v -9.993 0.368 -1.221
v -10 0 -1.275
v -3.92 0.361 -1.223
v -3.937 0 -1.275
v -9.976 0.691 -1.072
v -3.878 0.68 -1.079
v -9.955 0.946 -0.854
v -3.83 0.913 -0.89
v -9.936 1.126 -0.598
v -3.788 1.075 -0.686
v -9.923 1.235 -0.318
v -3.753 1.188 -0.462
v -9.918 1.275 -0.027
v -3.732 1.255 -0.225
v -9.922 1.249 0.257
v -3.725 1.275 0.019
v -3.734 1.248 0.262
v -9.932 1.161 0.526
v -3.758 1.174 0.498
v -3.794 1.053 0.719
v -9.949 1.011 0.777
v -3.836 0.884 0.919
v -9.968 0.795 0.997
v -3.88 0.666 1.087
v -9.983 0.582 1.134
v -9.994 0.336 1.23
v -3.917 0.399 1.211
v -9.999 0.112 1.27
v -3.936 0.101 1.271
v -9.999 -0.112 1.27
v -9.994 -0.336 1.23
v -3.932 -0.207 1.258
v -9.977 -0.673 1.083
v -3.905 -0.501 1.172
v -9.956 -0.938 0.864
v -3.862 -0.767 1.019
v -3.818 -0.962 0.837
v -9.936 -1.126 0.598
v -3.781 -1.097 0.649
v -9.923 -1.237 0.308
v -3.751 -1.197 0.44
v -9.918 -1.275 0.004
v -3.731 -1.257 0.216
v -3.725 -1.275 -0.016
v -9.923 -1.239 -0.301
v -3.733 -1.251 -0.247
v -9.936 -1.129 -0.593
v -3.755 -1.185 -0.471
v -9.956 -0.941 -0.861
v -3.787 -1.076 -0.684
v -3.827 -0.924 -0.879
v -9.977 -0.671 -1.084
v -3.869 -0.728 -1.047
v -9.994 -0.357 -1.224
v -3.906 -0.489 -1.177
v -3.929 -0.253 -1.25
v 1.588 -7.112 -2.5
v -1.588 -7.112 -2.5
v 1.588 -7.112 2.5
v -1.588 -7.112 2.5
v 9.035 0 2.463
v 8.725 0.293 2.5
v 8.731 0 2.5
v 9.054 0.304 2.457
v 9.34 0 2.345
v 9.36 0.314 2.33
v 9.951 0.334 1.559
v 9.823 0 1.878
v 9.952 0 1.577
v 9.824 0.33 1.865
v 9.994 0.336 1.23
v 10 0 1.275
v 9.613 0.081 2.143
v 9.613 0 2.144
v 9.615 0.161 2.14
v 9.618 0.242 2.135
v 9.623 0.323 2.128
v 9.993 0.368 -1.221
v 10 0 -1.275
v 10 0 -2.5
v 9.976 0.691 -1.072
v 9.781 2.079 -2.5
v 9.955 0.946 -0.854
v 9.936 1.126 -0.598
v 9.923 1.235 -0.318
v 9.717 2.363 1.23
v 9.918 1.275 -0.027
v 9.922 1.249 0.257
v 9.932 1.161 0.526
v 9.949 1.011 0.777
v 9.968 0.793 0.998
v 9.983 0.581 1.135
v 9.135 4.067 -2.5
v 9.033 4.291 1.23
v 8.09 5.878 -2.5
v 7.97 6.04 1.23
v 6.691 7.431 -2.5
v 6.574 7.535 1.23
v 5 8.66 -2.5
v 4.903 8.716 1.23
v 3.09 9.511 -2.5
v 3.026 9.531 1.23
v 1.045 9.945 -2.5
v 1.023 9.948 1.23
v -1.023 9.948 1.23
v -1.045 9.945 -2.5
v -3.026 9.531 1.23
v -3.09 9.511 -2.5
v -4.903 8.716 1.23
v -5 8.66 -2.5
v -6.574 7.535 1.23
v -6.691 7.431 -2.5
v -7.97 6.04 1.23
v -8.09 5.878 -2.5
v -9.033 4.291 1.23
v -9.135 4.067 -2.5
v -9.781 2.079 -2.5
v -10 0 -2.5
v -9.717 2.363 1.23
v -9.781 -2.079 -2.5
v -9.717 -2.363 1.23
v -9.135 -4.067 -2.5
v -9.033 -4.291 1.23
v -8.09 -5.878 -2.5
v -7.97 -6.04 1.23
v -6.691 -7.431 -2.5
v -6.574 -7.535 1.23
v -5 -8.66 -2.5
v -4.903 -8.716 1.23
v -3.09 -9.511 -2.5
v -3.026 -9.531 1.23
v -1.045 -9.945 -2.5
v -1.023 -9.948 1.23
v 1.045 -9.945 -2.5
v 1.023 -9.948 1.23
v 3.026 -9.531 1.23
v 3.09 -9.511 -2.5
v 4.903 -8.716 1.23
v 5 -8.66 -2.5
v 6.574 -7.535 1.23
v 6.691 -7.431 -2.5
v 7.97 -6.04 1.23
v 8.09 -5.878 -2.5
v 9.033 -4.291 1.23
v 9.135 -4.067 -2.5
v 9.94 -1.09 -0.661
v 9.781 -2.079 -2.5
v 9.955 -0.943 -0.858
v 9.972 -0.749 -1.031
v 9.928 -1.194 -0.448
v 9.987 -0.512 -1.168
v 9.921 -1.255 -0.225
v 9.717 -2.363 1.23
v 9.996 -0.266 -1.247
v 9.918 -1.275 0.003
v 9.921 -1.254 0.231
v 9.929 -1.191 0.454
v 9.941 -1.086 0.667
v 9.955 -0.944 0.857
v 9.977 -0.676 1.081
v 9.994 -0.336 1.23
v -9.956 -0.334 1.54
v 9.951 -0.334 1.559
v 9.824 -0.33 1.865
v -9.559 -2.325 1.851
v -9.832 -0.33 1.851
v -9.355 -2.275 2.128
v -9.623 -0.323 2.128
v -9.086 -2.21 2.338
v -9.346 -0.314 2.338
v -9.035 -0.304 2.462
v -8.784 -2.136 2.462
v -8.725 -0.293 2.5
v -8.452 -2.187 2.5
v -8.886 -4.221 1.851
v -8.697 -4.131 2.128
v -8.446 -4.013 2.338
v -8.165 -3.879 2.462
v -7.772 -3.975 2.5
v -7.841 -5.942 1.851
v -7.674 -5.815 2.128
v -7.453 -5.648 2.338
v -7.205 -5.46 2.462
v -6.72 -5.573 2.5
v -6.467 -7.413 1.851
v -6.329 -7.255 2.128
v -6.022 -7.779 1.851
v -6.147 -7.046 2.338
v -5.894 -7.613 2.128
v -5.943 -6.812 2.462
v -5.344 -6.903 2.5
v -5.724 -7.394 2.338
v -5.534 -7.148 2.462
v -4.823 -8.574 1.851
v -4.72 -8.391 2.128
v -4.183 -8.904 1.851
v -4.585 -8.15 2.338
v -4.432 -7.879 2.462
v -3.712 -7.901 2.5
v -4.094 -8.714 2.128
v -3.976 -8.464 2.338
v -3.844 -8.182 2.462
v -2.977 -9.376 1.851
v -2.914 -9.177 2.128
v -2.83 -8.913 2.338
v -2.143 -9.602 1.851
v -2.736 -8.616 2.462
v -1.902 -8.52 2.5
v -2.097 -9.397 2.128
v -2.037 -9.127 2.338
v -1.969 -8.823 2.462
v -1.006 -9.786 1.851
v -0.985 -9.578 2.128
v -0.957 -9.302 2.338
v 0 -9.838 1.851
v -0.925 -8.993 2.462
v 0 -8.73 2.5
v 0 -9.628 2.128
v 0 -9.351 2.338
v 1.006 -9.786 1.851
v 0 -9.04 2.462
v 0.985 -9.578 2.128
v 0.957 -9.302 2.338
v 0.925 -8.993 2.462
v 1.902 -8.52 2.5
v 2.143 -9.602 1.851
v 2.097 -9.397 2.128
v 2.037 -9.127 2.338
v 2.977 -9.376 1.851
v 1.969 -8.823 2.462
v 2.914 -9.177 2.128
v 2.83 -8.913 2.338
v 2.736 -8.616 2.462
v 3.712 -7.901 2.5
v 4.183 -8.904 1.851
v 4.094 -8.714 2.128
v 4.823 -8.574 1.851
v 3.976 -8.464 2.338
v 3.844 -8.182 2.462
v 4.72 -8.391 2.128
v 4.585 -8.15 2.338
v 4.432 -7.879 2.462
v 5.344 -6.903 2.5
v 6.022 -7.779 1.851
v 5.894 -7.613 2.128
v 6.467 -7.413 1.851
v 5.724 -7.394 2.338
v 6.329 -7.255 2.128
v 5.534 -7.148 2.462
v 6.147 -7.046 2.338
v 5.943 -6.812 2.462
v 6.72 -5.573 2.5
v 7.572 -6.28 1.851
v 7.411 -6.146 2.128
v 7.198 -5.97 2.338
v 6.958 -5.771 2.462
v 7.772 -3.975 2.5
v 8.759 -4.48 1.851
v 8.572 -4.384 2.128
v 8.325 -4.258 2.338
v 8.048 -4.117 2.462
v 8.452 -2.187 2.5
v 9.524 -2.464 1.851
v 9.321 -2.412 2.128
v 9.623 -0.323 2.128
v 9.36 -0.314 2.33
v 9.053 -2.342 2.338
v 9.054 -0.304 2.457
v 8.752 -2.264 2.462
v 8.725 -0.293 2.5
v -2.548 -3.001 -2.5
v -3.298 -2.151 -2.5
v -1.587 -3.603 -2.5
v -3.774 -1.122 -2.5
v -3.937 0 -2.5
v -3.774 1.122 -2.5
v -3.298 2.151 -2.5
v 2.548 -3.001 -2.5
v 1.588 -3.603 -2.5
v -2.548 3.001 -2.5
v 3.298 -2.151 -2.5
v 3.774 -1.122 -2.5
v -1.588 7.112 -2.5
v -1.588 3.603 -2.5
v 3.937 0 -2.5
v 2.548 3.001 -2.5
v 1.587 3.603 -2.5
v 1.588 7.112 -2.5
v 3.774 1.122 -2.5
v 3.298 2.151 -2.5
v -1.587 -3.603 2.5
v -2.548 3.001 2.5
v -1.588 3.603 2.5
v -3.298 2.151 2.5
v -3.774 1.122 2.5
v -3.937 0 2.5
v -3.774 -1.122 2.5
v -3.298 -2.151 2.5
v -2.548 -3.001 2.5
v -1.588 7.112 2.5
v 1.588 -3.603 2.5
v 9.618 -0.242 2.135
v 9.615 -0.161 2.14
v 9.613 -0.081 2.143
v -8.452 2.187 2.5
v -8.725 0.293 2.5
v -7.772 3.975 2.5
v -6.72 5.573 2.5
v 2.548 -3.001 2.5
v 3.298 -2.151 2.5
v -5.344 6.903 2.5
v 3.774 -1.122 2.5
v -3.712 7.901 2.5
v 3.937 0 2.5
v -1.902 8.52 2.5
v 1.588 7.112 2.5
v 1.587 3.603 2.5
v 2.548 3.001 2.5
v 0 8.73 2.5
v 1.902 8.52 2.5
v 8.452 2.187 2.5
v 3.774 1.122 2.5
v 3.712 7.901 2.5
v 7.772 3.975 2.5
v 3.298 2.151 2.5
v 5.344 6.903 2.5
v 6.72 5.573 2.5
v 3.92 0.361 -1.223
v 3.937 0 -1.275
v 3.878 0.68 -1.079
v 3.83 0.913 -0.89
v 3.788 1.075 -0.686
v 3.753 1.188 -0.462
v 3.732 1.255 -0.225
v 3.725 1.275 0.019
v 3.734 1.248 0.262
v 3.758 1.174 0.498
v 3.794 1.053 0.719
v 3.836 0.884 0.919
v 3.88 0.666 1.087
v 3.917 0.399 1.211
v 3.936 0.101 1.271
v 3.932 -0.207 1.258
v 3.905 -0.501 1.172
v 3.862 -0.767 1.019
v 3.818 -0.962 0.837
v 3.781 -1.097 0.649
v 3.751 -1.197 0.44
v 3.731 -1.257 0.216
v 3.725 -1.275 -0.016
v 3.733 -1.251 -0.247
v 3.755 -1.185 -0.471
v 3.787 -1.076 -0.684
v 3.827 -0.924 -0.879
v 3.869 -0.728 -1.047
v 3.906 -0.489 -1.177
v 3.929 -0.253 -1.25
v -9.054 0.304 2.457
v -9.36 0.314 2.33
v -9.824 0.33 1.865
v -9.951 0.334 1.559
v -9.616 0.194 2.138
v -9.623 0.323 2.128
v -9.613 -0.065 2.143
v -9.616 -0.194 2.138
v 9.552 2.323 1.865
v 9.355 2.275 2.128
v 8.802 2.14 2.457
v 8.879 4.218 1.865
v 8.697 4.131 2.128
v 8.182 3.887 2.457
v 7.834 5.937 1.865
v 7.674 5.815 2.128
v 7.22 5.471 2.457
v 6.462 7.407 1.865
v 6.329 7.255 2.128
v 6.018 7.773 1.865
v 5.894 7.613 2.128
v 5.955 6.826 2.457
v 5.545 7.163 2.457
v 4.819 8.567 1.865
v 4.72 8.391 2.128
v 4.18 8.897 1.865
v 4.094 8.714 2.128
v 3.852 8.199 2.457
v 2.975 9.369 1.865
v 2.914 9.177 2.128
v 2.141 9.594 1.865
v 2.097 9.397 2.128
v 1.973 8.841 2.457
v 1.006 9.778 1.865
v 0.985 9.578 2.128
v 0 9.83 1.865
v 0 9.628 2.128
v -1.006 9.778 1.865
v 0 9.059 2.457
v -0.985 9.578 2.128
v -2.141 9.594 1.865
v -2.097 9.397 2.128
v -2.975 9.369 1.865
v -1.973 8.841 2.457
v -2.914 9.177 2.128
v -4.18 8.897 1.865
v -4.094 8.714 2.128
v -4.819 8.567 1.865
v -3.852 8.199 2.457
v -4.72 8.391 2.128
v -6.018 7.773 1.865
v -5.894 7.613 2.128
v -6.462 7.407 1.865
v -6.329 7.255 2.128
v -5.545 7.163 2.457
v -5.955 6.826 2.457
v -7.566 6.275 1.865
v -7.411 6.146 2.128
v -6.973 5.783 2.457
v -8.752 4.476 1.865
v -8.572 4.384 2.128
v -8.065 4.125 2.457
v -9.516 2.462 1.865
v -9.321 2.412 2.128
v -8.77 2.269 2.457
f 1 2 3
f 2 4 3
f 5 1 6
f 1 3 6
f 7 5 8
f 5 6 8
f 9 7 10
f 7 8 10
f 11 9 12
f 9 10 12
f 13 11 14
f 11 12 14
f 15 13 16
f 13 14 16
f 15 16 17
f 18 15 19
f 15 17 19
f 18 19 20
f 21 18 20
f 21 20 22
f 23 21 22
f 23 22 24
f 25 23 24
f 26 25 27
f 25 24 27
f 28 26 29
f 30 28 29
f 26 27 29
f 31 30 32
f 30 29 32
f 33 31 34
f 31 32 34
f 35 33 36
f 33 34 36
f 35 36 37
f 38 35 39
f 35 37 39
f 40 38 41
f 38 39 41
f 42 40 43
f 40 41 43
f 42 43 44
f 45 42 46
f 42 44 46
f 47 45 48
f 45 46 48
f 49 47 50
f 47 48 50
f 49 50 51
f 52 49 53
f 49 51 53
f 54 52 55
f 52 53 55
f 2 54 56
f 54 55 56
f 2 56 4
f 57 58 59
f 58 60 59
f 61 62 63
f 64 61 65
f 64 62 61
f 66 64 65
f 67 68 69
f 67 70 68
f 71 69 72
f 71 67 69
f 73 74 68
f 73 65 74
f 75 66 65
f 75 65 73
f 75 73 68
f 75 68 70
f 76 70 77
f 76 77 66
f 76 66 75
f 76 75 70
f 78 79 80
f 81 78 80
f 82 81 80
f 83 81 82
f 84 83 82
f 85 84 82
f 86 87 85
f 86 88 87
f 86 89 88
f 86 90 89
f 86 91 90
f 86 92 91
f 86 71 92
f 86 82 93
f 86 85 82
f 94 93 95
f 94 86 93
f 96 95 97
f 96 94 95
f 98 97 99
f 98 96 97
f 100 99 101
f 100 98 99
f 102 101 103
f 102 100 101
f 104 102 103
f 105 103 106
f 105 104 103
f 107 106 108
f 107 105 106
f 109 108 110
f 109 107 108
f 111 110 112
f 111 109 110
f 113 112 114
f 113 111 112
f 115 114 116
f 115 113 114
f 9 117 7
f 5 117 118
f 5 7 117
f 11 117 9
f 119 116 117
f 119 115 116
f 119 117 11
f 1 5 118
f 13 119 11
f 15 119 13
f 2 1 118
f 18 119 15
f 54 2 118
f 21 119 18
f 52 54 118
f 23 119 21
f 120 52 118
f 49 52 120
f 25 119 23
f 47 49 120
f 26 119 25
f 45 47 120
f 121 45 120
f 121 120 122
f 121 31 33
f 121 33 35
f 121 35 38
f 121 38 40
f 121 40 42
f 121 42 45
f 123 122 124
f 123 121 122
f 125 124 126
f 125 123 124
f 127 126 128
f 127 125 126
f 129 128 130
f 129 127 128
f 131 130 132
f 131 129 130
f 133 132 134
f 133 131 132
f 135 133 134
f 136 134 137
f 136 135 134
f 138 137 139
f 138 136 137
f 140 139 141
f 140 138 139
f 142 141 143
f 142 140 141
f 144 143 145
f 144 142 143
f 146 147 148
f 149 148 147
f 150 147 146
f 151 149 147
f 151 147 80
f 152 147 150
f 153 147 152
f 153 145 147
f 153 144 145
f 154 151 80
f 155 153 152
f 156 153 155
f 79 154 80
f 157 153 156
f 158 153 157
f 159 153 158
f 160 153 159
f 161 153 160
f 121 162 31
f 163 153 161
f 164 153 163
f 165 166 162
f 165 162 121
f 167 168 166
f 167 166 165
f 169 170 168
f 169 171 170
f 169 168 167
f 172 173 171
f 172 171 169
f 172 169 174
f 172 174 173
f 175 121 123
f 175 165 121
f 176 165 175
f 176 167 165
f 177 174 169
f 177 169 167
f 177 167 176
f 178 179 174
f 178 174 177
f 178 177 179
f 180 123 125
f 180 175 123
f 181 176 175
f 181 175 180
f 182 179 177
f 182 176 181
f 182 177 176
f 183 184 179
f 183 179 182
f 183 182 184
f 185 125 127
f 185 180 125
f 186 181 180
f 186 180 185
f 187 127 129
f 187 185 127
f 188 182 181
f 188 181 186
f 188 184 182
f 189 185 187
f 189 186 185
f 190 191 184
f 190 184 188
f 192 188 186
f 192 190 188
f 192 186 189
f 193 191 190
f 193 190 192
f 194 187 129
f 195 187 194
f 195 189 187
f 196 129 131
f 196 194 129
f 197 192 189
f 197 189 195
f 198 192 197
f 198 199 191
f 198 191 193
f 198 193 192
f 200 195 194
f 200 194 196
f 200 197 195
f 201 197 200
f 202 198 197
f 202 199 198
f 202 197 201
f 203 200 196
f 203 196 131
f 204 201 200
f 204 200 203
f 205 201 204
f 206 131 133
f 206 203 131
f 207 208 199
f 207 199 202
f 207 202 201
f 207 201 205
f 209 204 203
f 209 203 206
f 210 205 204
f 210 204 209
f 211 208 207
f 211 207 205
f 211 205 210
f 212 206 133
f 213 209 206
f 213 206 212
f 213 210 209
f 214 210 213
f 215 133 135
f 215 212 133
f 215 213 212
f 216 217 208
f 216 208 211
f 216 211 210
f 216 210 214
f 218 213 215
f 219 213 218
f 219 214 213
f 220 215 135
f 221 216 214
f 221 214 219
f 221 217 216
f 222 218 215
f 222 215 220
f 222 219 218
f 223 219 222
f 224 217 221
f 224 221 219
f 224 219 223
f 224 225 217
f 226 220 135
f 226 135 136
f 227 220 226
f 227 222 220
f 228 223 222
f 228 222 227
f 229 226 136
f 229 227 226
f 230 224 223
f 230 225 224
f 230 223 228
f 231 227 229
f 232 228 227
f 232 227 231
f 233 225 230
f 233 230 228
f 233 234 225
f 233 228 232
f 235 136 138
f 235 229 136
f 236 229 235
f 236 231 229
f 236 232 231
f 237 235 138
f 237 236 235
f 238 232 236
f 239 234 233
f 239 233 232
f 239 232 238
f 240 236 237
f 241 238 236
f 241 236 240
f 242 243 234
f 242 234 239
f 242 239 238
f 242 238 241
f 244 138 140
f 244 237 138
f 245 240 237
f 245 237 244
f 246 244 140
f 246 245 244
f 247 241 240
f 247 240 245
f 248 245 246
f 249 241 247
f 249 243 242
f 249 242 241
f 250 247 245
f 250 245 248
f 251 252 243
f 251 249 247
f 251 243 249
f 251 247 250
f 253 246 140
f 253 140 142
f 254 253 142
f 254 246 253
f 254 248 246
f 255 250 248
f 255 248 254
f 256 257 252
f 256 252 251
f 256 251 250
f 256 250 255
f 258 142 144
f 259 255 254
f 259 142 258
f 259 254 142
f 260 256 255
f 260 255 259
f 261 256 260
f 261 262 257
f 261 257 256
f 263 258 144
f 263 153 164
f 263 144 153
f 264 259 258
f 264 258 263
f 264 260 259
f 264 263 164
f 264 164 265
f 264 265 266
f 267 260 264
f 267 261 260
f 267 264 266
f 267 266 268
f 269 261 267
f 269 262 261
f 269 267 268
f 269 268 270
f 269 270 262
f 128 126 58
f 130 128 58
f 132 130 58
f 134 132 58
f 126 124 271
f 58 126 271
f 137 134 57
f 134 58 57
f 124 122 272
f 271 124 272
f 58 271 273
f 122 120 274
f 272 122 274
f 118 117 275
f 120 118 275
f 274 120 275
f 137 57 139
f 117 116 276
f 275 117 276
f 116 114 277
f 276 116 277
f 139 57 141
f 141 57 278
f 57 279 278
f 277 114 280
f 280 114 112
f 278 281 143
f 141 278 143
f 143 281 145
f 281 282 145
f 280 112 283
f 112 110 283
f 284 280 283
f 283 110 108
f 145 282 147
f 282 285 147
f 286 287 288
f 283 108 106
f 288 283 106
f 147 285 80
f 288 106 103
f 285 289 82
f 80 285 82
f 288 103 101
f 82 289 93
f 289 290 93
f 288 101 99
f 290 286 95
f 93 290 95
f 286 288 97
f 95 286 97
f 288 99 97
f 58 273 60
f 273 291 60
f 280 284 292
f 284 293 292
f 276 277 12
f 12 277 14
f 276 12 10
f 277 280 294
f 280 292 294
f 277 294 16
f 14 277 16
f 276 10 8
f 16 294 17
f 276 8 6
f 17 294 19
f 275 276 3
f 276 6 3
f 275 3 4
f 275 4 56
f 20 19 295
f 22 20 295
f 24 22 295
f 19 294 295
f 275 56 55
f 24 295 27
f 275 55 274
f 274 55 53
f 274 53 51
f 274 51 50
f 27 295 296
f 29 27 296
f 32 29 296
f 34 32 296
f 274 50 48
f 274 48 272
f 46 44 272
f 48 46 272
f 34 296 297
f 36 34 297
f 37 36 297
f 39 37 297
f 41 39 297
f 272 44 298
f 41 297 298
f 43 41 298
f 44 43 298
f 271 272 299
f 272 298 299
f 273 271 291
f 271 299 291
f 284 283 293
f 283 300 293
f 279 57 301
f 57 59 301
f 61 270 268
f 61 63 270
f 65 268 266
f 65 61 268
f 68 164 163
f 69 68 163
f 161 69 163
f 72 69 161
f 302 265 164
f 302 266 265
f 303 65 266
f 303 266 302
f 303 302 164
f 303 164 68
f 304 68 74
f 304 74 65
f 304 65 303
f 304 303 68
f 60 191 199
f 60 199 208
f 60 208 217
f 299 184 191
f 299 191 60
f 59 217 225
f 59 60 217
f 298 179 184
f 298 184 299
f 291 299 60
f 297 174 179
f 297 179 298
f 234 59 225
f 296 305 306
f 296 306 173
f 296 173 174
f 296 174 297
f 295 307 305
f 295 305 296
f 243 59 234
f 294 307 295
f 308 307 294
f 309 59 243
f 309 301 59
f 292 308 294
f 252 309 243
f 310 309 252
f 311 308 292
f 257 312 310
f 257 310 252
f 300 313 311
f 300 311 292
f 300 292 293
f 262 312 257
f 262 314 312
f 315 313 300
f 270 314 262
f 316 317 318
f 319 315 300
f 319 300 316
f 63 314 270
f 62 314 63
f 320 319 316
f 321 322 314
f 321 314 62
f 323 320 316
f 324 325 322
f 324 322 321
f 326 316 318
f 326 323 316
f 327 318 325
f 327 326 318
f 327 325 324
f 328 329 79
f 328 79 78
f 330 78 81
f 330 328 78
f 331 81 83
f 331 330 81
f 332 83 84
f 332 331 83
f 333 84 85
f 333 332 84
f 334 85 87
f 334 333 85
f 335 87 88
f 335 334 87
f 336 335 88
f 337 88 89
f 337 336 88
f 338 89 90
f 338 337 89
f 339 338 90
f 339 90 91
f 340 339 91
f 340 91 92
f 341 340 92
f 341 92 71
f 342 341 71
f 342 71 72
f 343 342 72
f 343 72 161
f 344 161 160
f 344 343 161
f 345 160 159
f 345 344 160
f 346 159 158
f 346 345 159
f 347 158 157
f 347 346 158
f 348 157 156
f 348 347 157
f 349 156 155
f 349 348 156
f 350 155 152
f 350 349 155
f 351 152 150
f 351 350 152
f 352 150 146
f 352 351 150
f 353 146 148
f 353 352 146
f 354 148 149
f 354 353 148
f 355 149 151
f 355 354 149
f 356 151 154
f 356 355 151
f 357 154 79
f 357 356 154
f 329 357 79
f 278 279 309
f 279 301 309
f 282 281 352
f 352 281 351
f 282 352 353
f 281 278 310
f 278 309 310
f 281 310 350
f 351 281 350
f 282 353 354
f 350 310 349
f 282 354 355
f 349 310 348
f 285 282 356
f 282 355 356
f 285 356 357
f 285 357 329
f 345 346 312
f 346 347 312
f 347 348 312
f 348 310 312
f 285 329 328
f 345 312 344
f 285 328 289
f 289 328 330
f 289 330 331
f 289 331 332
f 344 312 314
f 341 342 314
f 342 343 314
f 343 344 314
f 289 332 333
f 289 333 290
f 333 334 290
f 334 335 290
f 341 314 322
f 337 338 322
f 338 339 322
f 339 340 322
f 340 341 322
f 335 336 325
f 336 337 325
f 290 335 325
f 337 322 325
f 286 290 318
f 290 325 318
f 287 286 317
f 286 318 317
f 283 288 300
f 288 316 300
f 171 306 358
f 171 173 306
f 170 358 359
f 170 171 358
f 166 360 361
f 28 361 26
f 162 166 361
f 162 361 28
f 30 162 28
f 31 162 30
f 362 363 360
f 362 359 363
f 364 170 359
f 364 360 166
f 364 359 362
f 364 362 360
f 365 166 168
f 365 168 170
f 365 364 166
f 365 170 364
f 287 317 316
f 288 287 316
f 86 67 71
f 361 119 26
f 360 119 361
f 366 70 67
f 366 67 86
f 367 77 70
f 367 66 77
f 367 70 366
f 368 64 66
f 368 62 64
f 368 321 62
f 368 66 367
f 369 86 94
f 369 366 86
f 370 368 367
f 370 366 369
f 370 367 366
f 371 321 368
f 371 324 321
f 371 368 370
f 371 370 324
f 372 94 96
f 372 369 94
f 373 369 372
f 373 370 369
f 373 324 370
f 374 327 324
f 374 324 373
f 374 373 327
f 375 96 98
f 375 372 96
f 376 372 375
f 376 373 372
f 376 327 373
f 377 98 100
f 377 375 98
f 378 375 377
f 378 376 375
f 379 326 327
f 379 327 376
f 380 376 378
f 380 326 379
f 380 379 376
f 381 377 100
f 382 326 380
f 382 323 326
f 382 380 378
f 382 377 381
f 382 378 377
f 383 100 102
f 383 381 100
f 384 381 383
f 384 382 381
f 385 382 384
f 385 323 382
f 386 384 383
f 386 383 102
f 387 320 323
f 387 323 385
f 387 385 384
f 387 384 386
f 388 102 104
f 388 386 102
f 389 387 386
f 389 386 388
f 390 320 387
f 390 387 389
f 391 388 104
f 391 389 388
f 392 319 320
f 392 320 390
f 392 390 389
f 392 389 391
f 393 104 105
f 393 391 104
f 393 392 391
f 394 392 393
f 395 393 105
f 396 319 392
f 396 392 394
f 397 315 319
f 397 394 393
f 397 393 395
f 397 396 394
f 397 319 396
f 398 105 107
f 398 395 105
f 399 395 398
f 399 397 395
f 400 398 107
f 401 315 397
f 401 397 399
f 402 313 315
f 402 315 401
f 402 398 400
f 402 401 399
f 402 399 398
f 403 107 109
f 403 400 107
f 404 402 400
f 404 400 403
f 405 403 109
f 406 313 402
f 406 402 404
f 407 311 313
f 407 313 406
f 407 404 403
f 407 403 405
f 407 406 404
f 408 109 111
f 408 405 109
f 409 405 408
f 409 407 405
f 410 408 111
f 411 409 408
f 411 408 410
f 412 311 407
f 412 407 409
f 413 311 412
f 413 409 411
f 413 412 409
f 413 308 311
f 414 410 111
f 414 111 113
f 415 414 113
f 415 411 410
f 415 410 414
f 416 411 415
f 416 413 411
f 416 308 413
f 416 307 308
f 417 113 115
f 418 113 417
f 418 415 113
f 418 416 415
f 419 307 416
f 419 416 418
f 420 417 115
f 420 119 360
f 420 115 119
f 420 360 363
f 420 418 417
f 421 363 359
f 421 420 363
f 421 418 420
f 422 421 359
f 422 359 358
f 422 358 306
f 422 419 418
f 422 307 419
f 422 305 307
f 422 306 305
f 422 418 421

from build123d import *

# Parameters (mm, degrees)
SKETCH1_R               = 10
BOSS_EXTRUDE1_DEPTH     = 2.5
SKETCH4_R               = 1.275
CUT_EXTRUDE1_DEPTH      = 11
CUT_EXTRUDE1_DEPTH_BACK = 11
FILLET1_R               = 1.27


with BuildPart() as part:
    # Sketch1 → Boss-Extrude1 (new body, symmetric)
    with BuildSketch(Plane.XY):
        Circle(SKETCH1_R)
        with BuildLine():
            Line((1.5875, 3.60275072), (1.5875, 7.112))
            Line((1.5875, 7.112), (-1.5875, 7.112))
            Line((-1.5875, 7.112), (-1.5875, 3.60275072))
            ThreePointArc((-1.5875, 3.60275072), (-3.937, 0), (-1.5875, -3.60275072))
            Line((-1.5875, -3.60275072), (-1.5875, -7.112))
            Line((-1.5875, -7.112), (1.5875, -7.112))
            Line((1.5875, -7.112), (1.5875, -3.60275072))
            ThreePointArc((1.5875, -3.60275072), (3.937, 0), (1.5875, 3.60275072))
        make_face(mode=Mode.SUBTRACT)
    extrude(amount=BOSS_EXTRUDE1_DEPTH, both=True)

    # Sketch4 → Cut-Extrude1 (cut, two sides)
    with BuildSketch(Plane(origin=(0, 0, 0), x_dir=(0, 0, -1), z_dir=(1, 0, 0))) as cut_extrude1_sk:
        Circle(SKETCH4_R)
    extrude(amount=CUT_EXTRUDE1_DEPTH, mode=Mode.SUBTRACT)
    extrude(cut_extrude1_sk.sketch, amount=-CUT_EXTRUDE1_DEPTH_BACK, mode=Mode.SUBTRACT)

    # Fillet1
    fillet1_edges = [part.edges().sort_by_distance(p)[0] for p in [
        (-10, 0, 2.5),
    ]]
    fillet(fillet1_edges, radius=FILLET1_R)


solid = part.part
